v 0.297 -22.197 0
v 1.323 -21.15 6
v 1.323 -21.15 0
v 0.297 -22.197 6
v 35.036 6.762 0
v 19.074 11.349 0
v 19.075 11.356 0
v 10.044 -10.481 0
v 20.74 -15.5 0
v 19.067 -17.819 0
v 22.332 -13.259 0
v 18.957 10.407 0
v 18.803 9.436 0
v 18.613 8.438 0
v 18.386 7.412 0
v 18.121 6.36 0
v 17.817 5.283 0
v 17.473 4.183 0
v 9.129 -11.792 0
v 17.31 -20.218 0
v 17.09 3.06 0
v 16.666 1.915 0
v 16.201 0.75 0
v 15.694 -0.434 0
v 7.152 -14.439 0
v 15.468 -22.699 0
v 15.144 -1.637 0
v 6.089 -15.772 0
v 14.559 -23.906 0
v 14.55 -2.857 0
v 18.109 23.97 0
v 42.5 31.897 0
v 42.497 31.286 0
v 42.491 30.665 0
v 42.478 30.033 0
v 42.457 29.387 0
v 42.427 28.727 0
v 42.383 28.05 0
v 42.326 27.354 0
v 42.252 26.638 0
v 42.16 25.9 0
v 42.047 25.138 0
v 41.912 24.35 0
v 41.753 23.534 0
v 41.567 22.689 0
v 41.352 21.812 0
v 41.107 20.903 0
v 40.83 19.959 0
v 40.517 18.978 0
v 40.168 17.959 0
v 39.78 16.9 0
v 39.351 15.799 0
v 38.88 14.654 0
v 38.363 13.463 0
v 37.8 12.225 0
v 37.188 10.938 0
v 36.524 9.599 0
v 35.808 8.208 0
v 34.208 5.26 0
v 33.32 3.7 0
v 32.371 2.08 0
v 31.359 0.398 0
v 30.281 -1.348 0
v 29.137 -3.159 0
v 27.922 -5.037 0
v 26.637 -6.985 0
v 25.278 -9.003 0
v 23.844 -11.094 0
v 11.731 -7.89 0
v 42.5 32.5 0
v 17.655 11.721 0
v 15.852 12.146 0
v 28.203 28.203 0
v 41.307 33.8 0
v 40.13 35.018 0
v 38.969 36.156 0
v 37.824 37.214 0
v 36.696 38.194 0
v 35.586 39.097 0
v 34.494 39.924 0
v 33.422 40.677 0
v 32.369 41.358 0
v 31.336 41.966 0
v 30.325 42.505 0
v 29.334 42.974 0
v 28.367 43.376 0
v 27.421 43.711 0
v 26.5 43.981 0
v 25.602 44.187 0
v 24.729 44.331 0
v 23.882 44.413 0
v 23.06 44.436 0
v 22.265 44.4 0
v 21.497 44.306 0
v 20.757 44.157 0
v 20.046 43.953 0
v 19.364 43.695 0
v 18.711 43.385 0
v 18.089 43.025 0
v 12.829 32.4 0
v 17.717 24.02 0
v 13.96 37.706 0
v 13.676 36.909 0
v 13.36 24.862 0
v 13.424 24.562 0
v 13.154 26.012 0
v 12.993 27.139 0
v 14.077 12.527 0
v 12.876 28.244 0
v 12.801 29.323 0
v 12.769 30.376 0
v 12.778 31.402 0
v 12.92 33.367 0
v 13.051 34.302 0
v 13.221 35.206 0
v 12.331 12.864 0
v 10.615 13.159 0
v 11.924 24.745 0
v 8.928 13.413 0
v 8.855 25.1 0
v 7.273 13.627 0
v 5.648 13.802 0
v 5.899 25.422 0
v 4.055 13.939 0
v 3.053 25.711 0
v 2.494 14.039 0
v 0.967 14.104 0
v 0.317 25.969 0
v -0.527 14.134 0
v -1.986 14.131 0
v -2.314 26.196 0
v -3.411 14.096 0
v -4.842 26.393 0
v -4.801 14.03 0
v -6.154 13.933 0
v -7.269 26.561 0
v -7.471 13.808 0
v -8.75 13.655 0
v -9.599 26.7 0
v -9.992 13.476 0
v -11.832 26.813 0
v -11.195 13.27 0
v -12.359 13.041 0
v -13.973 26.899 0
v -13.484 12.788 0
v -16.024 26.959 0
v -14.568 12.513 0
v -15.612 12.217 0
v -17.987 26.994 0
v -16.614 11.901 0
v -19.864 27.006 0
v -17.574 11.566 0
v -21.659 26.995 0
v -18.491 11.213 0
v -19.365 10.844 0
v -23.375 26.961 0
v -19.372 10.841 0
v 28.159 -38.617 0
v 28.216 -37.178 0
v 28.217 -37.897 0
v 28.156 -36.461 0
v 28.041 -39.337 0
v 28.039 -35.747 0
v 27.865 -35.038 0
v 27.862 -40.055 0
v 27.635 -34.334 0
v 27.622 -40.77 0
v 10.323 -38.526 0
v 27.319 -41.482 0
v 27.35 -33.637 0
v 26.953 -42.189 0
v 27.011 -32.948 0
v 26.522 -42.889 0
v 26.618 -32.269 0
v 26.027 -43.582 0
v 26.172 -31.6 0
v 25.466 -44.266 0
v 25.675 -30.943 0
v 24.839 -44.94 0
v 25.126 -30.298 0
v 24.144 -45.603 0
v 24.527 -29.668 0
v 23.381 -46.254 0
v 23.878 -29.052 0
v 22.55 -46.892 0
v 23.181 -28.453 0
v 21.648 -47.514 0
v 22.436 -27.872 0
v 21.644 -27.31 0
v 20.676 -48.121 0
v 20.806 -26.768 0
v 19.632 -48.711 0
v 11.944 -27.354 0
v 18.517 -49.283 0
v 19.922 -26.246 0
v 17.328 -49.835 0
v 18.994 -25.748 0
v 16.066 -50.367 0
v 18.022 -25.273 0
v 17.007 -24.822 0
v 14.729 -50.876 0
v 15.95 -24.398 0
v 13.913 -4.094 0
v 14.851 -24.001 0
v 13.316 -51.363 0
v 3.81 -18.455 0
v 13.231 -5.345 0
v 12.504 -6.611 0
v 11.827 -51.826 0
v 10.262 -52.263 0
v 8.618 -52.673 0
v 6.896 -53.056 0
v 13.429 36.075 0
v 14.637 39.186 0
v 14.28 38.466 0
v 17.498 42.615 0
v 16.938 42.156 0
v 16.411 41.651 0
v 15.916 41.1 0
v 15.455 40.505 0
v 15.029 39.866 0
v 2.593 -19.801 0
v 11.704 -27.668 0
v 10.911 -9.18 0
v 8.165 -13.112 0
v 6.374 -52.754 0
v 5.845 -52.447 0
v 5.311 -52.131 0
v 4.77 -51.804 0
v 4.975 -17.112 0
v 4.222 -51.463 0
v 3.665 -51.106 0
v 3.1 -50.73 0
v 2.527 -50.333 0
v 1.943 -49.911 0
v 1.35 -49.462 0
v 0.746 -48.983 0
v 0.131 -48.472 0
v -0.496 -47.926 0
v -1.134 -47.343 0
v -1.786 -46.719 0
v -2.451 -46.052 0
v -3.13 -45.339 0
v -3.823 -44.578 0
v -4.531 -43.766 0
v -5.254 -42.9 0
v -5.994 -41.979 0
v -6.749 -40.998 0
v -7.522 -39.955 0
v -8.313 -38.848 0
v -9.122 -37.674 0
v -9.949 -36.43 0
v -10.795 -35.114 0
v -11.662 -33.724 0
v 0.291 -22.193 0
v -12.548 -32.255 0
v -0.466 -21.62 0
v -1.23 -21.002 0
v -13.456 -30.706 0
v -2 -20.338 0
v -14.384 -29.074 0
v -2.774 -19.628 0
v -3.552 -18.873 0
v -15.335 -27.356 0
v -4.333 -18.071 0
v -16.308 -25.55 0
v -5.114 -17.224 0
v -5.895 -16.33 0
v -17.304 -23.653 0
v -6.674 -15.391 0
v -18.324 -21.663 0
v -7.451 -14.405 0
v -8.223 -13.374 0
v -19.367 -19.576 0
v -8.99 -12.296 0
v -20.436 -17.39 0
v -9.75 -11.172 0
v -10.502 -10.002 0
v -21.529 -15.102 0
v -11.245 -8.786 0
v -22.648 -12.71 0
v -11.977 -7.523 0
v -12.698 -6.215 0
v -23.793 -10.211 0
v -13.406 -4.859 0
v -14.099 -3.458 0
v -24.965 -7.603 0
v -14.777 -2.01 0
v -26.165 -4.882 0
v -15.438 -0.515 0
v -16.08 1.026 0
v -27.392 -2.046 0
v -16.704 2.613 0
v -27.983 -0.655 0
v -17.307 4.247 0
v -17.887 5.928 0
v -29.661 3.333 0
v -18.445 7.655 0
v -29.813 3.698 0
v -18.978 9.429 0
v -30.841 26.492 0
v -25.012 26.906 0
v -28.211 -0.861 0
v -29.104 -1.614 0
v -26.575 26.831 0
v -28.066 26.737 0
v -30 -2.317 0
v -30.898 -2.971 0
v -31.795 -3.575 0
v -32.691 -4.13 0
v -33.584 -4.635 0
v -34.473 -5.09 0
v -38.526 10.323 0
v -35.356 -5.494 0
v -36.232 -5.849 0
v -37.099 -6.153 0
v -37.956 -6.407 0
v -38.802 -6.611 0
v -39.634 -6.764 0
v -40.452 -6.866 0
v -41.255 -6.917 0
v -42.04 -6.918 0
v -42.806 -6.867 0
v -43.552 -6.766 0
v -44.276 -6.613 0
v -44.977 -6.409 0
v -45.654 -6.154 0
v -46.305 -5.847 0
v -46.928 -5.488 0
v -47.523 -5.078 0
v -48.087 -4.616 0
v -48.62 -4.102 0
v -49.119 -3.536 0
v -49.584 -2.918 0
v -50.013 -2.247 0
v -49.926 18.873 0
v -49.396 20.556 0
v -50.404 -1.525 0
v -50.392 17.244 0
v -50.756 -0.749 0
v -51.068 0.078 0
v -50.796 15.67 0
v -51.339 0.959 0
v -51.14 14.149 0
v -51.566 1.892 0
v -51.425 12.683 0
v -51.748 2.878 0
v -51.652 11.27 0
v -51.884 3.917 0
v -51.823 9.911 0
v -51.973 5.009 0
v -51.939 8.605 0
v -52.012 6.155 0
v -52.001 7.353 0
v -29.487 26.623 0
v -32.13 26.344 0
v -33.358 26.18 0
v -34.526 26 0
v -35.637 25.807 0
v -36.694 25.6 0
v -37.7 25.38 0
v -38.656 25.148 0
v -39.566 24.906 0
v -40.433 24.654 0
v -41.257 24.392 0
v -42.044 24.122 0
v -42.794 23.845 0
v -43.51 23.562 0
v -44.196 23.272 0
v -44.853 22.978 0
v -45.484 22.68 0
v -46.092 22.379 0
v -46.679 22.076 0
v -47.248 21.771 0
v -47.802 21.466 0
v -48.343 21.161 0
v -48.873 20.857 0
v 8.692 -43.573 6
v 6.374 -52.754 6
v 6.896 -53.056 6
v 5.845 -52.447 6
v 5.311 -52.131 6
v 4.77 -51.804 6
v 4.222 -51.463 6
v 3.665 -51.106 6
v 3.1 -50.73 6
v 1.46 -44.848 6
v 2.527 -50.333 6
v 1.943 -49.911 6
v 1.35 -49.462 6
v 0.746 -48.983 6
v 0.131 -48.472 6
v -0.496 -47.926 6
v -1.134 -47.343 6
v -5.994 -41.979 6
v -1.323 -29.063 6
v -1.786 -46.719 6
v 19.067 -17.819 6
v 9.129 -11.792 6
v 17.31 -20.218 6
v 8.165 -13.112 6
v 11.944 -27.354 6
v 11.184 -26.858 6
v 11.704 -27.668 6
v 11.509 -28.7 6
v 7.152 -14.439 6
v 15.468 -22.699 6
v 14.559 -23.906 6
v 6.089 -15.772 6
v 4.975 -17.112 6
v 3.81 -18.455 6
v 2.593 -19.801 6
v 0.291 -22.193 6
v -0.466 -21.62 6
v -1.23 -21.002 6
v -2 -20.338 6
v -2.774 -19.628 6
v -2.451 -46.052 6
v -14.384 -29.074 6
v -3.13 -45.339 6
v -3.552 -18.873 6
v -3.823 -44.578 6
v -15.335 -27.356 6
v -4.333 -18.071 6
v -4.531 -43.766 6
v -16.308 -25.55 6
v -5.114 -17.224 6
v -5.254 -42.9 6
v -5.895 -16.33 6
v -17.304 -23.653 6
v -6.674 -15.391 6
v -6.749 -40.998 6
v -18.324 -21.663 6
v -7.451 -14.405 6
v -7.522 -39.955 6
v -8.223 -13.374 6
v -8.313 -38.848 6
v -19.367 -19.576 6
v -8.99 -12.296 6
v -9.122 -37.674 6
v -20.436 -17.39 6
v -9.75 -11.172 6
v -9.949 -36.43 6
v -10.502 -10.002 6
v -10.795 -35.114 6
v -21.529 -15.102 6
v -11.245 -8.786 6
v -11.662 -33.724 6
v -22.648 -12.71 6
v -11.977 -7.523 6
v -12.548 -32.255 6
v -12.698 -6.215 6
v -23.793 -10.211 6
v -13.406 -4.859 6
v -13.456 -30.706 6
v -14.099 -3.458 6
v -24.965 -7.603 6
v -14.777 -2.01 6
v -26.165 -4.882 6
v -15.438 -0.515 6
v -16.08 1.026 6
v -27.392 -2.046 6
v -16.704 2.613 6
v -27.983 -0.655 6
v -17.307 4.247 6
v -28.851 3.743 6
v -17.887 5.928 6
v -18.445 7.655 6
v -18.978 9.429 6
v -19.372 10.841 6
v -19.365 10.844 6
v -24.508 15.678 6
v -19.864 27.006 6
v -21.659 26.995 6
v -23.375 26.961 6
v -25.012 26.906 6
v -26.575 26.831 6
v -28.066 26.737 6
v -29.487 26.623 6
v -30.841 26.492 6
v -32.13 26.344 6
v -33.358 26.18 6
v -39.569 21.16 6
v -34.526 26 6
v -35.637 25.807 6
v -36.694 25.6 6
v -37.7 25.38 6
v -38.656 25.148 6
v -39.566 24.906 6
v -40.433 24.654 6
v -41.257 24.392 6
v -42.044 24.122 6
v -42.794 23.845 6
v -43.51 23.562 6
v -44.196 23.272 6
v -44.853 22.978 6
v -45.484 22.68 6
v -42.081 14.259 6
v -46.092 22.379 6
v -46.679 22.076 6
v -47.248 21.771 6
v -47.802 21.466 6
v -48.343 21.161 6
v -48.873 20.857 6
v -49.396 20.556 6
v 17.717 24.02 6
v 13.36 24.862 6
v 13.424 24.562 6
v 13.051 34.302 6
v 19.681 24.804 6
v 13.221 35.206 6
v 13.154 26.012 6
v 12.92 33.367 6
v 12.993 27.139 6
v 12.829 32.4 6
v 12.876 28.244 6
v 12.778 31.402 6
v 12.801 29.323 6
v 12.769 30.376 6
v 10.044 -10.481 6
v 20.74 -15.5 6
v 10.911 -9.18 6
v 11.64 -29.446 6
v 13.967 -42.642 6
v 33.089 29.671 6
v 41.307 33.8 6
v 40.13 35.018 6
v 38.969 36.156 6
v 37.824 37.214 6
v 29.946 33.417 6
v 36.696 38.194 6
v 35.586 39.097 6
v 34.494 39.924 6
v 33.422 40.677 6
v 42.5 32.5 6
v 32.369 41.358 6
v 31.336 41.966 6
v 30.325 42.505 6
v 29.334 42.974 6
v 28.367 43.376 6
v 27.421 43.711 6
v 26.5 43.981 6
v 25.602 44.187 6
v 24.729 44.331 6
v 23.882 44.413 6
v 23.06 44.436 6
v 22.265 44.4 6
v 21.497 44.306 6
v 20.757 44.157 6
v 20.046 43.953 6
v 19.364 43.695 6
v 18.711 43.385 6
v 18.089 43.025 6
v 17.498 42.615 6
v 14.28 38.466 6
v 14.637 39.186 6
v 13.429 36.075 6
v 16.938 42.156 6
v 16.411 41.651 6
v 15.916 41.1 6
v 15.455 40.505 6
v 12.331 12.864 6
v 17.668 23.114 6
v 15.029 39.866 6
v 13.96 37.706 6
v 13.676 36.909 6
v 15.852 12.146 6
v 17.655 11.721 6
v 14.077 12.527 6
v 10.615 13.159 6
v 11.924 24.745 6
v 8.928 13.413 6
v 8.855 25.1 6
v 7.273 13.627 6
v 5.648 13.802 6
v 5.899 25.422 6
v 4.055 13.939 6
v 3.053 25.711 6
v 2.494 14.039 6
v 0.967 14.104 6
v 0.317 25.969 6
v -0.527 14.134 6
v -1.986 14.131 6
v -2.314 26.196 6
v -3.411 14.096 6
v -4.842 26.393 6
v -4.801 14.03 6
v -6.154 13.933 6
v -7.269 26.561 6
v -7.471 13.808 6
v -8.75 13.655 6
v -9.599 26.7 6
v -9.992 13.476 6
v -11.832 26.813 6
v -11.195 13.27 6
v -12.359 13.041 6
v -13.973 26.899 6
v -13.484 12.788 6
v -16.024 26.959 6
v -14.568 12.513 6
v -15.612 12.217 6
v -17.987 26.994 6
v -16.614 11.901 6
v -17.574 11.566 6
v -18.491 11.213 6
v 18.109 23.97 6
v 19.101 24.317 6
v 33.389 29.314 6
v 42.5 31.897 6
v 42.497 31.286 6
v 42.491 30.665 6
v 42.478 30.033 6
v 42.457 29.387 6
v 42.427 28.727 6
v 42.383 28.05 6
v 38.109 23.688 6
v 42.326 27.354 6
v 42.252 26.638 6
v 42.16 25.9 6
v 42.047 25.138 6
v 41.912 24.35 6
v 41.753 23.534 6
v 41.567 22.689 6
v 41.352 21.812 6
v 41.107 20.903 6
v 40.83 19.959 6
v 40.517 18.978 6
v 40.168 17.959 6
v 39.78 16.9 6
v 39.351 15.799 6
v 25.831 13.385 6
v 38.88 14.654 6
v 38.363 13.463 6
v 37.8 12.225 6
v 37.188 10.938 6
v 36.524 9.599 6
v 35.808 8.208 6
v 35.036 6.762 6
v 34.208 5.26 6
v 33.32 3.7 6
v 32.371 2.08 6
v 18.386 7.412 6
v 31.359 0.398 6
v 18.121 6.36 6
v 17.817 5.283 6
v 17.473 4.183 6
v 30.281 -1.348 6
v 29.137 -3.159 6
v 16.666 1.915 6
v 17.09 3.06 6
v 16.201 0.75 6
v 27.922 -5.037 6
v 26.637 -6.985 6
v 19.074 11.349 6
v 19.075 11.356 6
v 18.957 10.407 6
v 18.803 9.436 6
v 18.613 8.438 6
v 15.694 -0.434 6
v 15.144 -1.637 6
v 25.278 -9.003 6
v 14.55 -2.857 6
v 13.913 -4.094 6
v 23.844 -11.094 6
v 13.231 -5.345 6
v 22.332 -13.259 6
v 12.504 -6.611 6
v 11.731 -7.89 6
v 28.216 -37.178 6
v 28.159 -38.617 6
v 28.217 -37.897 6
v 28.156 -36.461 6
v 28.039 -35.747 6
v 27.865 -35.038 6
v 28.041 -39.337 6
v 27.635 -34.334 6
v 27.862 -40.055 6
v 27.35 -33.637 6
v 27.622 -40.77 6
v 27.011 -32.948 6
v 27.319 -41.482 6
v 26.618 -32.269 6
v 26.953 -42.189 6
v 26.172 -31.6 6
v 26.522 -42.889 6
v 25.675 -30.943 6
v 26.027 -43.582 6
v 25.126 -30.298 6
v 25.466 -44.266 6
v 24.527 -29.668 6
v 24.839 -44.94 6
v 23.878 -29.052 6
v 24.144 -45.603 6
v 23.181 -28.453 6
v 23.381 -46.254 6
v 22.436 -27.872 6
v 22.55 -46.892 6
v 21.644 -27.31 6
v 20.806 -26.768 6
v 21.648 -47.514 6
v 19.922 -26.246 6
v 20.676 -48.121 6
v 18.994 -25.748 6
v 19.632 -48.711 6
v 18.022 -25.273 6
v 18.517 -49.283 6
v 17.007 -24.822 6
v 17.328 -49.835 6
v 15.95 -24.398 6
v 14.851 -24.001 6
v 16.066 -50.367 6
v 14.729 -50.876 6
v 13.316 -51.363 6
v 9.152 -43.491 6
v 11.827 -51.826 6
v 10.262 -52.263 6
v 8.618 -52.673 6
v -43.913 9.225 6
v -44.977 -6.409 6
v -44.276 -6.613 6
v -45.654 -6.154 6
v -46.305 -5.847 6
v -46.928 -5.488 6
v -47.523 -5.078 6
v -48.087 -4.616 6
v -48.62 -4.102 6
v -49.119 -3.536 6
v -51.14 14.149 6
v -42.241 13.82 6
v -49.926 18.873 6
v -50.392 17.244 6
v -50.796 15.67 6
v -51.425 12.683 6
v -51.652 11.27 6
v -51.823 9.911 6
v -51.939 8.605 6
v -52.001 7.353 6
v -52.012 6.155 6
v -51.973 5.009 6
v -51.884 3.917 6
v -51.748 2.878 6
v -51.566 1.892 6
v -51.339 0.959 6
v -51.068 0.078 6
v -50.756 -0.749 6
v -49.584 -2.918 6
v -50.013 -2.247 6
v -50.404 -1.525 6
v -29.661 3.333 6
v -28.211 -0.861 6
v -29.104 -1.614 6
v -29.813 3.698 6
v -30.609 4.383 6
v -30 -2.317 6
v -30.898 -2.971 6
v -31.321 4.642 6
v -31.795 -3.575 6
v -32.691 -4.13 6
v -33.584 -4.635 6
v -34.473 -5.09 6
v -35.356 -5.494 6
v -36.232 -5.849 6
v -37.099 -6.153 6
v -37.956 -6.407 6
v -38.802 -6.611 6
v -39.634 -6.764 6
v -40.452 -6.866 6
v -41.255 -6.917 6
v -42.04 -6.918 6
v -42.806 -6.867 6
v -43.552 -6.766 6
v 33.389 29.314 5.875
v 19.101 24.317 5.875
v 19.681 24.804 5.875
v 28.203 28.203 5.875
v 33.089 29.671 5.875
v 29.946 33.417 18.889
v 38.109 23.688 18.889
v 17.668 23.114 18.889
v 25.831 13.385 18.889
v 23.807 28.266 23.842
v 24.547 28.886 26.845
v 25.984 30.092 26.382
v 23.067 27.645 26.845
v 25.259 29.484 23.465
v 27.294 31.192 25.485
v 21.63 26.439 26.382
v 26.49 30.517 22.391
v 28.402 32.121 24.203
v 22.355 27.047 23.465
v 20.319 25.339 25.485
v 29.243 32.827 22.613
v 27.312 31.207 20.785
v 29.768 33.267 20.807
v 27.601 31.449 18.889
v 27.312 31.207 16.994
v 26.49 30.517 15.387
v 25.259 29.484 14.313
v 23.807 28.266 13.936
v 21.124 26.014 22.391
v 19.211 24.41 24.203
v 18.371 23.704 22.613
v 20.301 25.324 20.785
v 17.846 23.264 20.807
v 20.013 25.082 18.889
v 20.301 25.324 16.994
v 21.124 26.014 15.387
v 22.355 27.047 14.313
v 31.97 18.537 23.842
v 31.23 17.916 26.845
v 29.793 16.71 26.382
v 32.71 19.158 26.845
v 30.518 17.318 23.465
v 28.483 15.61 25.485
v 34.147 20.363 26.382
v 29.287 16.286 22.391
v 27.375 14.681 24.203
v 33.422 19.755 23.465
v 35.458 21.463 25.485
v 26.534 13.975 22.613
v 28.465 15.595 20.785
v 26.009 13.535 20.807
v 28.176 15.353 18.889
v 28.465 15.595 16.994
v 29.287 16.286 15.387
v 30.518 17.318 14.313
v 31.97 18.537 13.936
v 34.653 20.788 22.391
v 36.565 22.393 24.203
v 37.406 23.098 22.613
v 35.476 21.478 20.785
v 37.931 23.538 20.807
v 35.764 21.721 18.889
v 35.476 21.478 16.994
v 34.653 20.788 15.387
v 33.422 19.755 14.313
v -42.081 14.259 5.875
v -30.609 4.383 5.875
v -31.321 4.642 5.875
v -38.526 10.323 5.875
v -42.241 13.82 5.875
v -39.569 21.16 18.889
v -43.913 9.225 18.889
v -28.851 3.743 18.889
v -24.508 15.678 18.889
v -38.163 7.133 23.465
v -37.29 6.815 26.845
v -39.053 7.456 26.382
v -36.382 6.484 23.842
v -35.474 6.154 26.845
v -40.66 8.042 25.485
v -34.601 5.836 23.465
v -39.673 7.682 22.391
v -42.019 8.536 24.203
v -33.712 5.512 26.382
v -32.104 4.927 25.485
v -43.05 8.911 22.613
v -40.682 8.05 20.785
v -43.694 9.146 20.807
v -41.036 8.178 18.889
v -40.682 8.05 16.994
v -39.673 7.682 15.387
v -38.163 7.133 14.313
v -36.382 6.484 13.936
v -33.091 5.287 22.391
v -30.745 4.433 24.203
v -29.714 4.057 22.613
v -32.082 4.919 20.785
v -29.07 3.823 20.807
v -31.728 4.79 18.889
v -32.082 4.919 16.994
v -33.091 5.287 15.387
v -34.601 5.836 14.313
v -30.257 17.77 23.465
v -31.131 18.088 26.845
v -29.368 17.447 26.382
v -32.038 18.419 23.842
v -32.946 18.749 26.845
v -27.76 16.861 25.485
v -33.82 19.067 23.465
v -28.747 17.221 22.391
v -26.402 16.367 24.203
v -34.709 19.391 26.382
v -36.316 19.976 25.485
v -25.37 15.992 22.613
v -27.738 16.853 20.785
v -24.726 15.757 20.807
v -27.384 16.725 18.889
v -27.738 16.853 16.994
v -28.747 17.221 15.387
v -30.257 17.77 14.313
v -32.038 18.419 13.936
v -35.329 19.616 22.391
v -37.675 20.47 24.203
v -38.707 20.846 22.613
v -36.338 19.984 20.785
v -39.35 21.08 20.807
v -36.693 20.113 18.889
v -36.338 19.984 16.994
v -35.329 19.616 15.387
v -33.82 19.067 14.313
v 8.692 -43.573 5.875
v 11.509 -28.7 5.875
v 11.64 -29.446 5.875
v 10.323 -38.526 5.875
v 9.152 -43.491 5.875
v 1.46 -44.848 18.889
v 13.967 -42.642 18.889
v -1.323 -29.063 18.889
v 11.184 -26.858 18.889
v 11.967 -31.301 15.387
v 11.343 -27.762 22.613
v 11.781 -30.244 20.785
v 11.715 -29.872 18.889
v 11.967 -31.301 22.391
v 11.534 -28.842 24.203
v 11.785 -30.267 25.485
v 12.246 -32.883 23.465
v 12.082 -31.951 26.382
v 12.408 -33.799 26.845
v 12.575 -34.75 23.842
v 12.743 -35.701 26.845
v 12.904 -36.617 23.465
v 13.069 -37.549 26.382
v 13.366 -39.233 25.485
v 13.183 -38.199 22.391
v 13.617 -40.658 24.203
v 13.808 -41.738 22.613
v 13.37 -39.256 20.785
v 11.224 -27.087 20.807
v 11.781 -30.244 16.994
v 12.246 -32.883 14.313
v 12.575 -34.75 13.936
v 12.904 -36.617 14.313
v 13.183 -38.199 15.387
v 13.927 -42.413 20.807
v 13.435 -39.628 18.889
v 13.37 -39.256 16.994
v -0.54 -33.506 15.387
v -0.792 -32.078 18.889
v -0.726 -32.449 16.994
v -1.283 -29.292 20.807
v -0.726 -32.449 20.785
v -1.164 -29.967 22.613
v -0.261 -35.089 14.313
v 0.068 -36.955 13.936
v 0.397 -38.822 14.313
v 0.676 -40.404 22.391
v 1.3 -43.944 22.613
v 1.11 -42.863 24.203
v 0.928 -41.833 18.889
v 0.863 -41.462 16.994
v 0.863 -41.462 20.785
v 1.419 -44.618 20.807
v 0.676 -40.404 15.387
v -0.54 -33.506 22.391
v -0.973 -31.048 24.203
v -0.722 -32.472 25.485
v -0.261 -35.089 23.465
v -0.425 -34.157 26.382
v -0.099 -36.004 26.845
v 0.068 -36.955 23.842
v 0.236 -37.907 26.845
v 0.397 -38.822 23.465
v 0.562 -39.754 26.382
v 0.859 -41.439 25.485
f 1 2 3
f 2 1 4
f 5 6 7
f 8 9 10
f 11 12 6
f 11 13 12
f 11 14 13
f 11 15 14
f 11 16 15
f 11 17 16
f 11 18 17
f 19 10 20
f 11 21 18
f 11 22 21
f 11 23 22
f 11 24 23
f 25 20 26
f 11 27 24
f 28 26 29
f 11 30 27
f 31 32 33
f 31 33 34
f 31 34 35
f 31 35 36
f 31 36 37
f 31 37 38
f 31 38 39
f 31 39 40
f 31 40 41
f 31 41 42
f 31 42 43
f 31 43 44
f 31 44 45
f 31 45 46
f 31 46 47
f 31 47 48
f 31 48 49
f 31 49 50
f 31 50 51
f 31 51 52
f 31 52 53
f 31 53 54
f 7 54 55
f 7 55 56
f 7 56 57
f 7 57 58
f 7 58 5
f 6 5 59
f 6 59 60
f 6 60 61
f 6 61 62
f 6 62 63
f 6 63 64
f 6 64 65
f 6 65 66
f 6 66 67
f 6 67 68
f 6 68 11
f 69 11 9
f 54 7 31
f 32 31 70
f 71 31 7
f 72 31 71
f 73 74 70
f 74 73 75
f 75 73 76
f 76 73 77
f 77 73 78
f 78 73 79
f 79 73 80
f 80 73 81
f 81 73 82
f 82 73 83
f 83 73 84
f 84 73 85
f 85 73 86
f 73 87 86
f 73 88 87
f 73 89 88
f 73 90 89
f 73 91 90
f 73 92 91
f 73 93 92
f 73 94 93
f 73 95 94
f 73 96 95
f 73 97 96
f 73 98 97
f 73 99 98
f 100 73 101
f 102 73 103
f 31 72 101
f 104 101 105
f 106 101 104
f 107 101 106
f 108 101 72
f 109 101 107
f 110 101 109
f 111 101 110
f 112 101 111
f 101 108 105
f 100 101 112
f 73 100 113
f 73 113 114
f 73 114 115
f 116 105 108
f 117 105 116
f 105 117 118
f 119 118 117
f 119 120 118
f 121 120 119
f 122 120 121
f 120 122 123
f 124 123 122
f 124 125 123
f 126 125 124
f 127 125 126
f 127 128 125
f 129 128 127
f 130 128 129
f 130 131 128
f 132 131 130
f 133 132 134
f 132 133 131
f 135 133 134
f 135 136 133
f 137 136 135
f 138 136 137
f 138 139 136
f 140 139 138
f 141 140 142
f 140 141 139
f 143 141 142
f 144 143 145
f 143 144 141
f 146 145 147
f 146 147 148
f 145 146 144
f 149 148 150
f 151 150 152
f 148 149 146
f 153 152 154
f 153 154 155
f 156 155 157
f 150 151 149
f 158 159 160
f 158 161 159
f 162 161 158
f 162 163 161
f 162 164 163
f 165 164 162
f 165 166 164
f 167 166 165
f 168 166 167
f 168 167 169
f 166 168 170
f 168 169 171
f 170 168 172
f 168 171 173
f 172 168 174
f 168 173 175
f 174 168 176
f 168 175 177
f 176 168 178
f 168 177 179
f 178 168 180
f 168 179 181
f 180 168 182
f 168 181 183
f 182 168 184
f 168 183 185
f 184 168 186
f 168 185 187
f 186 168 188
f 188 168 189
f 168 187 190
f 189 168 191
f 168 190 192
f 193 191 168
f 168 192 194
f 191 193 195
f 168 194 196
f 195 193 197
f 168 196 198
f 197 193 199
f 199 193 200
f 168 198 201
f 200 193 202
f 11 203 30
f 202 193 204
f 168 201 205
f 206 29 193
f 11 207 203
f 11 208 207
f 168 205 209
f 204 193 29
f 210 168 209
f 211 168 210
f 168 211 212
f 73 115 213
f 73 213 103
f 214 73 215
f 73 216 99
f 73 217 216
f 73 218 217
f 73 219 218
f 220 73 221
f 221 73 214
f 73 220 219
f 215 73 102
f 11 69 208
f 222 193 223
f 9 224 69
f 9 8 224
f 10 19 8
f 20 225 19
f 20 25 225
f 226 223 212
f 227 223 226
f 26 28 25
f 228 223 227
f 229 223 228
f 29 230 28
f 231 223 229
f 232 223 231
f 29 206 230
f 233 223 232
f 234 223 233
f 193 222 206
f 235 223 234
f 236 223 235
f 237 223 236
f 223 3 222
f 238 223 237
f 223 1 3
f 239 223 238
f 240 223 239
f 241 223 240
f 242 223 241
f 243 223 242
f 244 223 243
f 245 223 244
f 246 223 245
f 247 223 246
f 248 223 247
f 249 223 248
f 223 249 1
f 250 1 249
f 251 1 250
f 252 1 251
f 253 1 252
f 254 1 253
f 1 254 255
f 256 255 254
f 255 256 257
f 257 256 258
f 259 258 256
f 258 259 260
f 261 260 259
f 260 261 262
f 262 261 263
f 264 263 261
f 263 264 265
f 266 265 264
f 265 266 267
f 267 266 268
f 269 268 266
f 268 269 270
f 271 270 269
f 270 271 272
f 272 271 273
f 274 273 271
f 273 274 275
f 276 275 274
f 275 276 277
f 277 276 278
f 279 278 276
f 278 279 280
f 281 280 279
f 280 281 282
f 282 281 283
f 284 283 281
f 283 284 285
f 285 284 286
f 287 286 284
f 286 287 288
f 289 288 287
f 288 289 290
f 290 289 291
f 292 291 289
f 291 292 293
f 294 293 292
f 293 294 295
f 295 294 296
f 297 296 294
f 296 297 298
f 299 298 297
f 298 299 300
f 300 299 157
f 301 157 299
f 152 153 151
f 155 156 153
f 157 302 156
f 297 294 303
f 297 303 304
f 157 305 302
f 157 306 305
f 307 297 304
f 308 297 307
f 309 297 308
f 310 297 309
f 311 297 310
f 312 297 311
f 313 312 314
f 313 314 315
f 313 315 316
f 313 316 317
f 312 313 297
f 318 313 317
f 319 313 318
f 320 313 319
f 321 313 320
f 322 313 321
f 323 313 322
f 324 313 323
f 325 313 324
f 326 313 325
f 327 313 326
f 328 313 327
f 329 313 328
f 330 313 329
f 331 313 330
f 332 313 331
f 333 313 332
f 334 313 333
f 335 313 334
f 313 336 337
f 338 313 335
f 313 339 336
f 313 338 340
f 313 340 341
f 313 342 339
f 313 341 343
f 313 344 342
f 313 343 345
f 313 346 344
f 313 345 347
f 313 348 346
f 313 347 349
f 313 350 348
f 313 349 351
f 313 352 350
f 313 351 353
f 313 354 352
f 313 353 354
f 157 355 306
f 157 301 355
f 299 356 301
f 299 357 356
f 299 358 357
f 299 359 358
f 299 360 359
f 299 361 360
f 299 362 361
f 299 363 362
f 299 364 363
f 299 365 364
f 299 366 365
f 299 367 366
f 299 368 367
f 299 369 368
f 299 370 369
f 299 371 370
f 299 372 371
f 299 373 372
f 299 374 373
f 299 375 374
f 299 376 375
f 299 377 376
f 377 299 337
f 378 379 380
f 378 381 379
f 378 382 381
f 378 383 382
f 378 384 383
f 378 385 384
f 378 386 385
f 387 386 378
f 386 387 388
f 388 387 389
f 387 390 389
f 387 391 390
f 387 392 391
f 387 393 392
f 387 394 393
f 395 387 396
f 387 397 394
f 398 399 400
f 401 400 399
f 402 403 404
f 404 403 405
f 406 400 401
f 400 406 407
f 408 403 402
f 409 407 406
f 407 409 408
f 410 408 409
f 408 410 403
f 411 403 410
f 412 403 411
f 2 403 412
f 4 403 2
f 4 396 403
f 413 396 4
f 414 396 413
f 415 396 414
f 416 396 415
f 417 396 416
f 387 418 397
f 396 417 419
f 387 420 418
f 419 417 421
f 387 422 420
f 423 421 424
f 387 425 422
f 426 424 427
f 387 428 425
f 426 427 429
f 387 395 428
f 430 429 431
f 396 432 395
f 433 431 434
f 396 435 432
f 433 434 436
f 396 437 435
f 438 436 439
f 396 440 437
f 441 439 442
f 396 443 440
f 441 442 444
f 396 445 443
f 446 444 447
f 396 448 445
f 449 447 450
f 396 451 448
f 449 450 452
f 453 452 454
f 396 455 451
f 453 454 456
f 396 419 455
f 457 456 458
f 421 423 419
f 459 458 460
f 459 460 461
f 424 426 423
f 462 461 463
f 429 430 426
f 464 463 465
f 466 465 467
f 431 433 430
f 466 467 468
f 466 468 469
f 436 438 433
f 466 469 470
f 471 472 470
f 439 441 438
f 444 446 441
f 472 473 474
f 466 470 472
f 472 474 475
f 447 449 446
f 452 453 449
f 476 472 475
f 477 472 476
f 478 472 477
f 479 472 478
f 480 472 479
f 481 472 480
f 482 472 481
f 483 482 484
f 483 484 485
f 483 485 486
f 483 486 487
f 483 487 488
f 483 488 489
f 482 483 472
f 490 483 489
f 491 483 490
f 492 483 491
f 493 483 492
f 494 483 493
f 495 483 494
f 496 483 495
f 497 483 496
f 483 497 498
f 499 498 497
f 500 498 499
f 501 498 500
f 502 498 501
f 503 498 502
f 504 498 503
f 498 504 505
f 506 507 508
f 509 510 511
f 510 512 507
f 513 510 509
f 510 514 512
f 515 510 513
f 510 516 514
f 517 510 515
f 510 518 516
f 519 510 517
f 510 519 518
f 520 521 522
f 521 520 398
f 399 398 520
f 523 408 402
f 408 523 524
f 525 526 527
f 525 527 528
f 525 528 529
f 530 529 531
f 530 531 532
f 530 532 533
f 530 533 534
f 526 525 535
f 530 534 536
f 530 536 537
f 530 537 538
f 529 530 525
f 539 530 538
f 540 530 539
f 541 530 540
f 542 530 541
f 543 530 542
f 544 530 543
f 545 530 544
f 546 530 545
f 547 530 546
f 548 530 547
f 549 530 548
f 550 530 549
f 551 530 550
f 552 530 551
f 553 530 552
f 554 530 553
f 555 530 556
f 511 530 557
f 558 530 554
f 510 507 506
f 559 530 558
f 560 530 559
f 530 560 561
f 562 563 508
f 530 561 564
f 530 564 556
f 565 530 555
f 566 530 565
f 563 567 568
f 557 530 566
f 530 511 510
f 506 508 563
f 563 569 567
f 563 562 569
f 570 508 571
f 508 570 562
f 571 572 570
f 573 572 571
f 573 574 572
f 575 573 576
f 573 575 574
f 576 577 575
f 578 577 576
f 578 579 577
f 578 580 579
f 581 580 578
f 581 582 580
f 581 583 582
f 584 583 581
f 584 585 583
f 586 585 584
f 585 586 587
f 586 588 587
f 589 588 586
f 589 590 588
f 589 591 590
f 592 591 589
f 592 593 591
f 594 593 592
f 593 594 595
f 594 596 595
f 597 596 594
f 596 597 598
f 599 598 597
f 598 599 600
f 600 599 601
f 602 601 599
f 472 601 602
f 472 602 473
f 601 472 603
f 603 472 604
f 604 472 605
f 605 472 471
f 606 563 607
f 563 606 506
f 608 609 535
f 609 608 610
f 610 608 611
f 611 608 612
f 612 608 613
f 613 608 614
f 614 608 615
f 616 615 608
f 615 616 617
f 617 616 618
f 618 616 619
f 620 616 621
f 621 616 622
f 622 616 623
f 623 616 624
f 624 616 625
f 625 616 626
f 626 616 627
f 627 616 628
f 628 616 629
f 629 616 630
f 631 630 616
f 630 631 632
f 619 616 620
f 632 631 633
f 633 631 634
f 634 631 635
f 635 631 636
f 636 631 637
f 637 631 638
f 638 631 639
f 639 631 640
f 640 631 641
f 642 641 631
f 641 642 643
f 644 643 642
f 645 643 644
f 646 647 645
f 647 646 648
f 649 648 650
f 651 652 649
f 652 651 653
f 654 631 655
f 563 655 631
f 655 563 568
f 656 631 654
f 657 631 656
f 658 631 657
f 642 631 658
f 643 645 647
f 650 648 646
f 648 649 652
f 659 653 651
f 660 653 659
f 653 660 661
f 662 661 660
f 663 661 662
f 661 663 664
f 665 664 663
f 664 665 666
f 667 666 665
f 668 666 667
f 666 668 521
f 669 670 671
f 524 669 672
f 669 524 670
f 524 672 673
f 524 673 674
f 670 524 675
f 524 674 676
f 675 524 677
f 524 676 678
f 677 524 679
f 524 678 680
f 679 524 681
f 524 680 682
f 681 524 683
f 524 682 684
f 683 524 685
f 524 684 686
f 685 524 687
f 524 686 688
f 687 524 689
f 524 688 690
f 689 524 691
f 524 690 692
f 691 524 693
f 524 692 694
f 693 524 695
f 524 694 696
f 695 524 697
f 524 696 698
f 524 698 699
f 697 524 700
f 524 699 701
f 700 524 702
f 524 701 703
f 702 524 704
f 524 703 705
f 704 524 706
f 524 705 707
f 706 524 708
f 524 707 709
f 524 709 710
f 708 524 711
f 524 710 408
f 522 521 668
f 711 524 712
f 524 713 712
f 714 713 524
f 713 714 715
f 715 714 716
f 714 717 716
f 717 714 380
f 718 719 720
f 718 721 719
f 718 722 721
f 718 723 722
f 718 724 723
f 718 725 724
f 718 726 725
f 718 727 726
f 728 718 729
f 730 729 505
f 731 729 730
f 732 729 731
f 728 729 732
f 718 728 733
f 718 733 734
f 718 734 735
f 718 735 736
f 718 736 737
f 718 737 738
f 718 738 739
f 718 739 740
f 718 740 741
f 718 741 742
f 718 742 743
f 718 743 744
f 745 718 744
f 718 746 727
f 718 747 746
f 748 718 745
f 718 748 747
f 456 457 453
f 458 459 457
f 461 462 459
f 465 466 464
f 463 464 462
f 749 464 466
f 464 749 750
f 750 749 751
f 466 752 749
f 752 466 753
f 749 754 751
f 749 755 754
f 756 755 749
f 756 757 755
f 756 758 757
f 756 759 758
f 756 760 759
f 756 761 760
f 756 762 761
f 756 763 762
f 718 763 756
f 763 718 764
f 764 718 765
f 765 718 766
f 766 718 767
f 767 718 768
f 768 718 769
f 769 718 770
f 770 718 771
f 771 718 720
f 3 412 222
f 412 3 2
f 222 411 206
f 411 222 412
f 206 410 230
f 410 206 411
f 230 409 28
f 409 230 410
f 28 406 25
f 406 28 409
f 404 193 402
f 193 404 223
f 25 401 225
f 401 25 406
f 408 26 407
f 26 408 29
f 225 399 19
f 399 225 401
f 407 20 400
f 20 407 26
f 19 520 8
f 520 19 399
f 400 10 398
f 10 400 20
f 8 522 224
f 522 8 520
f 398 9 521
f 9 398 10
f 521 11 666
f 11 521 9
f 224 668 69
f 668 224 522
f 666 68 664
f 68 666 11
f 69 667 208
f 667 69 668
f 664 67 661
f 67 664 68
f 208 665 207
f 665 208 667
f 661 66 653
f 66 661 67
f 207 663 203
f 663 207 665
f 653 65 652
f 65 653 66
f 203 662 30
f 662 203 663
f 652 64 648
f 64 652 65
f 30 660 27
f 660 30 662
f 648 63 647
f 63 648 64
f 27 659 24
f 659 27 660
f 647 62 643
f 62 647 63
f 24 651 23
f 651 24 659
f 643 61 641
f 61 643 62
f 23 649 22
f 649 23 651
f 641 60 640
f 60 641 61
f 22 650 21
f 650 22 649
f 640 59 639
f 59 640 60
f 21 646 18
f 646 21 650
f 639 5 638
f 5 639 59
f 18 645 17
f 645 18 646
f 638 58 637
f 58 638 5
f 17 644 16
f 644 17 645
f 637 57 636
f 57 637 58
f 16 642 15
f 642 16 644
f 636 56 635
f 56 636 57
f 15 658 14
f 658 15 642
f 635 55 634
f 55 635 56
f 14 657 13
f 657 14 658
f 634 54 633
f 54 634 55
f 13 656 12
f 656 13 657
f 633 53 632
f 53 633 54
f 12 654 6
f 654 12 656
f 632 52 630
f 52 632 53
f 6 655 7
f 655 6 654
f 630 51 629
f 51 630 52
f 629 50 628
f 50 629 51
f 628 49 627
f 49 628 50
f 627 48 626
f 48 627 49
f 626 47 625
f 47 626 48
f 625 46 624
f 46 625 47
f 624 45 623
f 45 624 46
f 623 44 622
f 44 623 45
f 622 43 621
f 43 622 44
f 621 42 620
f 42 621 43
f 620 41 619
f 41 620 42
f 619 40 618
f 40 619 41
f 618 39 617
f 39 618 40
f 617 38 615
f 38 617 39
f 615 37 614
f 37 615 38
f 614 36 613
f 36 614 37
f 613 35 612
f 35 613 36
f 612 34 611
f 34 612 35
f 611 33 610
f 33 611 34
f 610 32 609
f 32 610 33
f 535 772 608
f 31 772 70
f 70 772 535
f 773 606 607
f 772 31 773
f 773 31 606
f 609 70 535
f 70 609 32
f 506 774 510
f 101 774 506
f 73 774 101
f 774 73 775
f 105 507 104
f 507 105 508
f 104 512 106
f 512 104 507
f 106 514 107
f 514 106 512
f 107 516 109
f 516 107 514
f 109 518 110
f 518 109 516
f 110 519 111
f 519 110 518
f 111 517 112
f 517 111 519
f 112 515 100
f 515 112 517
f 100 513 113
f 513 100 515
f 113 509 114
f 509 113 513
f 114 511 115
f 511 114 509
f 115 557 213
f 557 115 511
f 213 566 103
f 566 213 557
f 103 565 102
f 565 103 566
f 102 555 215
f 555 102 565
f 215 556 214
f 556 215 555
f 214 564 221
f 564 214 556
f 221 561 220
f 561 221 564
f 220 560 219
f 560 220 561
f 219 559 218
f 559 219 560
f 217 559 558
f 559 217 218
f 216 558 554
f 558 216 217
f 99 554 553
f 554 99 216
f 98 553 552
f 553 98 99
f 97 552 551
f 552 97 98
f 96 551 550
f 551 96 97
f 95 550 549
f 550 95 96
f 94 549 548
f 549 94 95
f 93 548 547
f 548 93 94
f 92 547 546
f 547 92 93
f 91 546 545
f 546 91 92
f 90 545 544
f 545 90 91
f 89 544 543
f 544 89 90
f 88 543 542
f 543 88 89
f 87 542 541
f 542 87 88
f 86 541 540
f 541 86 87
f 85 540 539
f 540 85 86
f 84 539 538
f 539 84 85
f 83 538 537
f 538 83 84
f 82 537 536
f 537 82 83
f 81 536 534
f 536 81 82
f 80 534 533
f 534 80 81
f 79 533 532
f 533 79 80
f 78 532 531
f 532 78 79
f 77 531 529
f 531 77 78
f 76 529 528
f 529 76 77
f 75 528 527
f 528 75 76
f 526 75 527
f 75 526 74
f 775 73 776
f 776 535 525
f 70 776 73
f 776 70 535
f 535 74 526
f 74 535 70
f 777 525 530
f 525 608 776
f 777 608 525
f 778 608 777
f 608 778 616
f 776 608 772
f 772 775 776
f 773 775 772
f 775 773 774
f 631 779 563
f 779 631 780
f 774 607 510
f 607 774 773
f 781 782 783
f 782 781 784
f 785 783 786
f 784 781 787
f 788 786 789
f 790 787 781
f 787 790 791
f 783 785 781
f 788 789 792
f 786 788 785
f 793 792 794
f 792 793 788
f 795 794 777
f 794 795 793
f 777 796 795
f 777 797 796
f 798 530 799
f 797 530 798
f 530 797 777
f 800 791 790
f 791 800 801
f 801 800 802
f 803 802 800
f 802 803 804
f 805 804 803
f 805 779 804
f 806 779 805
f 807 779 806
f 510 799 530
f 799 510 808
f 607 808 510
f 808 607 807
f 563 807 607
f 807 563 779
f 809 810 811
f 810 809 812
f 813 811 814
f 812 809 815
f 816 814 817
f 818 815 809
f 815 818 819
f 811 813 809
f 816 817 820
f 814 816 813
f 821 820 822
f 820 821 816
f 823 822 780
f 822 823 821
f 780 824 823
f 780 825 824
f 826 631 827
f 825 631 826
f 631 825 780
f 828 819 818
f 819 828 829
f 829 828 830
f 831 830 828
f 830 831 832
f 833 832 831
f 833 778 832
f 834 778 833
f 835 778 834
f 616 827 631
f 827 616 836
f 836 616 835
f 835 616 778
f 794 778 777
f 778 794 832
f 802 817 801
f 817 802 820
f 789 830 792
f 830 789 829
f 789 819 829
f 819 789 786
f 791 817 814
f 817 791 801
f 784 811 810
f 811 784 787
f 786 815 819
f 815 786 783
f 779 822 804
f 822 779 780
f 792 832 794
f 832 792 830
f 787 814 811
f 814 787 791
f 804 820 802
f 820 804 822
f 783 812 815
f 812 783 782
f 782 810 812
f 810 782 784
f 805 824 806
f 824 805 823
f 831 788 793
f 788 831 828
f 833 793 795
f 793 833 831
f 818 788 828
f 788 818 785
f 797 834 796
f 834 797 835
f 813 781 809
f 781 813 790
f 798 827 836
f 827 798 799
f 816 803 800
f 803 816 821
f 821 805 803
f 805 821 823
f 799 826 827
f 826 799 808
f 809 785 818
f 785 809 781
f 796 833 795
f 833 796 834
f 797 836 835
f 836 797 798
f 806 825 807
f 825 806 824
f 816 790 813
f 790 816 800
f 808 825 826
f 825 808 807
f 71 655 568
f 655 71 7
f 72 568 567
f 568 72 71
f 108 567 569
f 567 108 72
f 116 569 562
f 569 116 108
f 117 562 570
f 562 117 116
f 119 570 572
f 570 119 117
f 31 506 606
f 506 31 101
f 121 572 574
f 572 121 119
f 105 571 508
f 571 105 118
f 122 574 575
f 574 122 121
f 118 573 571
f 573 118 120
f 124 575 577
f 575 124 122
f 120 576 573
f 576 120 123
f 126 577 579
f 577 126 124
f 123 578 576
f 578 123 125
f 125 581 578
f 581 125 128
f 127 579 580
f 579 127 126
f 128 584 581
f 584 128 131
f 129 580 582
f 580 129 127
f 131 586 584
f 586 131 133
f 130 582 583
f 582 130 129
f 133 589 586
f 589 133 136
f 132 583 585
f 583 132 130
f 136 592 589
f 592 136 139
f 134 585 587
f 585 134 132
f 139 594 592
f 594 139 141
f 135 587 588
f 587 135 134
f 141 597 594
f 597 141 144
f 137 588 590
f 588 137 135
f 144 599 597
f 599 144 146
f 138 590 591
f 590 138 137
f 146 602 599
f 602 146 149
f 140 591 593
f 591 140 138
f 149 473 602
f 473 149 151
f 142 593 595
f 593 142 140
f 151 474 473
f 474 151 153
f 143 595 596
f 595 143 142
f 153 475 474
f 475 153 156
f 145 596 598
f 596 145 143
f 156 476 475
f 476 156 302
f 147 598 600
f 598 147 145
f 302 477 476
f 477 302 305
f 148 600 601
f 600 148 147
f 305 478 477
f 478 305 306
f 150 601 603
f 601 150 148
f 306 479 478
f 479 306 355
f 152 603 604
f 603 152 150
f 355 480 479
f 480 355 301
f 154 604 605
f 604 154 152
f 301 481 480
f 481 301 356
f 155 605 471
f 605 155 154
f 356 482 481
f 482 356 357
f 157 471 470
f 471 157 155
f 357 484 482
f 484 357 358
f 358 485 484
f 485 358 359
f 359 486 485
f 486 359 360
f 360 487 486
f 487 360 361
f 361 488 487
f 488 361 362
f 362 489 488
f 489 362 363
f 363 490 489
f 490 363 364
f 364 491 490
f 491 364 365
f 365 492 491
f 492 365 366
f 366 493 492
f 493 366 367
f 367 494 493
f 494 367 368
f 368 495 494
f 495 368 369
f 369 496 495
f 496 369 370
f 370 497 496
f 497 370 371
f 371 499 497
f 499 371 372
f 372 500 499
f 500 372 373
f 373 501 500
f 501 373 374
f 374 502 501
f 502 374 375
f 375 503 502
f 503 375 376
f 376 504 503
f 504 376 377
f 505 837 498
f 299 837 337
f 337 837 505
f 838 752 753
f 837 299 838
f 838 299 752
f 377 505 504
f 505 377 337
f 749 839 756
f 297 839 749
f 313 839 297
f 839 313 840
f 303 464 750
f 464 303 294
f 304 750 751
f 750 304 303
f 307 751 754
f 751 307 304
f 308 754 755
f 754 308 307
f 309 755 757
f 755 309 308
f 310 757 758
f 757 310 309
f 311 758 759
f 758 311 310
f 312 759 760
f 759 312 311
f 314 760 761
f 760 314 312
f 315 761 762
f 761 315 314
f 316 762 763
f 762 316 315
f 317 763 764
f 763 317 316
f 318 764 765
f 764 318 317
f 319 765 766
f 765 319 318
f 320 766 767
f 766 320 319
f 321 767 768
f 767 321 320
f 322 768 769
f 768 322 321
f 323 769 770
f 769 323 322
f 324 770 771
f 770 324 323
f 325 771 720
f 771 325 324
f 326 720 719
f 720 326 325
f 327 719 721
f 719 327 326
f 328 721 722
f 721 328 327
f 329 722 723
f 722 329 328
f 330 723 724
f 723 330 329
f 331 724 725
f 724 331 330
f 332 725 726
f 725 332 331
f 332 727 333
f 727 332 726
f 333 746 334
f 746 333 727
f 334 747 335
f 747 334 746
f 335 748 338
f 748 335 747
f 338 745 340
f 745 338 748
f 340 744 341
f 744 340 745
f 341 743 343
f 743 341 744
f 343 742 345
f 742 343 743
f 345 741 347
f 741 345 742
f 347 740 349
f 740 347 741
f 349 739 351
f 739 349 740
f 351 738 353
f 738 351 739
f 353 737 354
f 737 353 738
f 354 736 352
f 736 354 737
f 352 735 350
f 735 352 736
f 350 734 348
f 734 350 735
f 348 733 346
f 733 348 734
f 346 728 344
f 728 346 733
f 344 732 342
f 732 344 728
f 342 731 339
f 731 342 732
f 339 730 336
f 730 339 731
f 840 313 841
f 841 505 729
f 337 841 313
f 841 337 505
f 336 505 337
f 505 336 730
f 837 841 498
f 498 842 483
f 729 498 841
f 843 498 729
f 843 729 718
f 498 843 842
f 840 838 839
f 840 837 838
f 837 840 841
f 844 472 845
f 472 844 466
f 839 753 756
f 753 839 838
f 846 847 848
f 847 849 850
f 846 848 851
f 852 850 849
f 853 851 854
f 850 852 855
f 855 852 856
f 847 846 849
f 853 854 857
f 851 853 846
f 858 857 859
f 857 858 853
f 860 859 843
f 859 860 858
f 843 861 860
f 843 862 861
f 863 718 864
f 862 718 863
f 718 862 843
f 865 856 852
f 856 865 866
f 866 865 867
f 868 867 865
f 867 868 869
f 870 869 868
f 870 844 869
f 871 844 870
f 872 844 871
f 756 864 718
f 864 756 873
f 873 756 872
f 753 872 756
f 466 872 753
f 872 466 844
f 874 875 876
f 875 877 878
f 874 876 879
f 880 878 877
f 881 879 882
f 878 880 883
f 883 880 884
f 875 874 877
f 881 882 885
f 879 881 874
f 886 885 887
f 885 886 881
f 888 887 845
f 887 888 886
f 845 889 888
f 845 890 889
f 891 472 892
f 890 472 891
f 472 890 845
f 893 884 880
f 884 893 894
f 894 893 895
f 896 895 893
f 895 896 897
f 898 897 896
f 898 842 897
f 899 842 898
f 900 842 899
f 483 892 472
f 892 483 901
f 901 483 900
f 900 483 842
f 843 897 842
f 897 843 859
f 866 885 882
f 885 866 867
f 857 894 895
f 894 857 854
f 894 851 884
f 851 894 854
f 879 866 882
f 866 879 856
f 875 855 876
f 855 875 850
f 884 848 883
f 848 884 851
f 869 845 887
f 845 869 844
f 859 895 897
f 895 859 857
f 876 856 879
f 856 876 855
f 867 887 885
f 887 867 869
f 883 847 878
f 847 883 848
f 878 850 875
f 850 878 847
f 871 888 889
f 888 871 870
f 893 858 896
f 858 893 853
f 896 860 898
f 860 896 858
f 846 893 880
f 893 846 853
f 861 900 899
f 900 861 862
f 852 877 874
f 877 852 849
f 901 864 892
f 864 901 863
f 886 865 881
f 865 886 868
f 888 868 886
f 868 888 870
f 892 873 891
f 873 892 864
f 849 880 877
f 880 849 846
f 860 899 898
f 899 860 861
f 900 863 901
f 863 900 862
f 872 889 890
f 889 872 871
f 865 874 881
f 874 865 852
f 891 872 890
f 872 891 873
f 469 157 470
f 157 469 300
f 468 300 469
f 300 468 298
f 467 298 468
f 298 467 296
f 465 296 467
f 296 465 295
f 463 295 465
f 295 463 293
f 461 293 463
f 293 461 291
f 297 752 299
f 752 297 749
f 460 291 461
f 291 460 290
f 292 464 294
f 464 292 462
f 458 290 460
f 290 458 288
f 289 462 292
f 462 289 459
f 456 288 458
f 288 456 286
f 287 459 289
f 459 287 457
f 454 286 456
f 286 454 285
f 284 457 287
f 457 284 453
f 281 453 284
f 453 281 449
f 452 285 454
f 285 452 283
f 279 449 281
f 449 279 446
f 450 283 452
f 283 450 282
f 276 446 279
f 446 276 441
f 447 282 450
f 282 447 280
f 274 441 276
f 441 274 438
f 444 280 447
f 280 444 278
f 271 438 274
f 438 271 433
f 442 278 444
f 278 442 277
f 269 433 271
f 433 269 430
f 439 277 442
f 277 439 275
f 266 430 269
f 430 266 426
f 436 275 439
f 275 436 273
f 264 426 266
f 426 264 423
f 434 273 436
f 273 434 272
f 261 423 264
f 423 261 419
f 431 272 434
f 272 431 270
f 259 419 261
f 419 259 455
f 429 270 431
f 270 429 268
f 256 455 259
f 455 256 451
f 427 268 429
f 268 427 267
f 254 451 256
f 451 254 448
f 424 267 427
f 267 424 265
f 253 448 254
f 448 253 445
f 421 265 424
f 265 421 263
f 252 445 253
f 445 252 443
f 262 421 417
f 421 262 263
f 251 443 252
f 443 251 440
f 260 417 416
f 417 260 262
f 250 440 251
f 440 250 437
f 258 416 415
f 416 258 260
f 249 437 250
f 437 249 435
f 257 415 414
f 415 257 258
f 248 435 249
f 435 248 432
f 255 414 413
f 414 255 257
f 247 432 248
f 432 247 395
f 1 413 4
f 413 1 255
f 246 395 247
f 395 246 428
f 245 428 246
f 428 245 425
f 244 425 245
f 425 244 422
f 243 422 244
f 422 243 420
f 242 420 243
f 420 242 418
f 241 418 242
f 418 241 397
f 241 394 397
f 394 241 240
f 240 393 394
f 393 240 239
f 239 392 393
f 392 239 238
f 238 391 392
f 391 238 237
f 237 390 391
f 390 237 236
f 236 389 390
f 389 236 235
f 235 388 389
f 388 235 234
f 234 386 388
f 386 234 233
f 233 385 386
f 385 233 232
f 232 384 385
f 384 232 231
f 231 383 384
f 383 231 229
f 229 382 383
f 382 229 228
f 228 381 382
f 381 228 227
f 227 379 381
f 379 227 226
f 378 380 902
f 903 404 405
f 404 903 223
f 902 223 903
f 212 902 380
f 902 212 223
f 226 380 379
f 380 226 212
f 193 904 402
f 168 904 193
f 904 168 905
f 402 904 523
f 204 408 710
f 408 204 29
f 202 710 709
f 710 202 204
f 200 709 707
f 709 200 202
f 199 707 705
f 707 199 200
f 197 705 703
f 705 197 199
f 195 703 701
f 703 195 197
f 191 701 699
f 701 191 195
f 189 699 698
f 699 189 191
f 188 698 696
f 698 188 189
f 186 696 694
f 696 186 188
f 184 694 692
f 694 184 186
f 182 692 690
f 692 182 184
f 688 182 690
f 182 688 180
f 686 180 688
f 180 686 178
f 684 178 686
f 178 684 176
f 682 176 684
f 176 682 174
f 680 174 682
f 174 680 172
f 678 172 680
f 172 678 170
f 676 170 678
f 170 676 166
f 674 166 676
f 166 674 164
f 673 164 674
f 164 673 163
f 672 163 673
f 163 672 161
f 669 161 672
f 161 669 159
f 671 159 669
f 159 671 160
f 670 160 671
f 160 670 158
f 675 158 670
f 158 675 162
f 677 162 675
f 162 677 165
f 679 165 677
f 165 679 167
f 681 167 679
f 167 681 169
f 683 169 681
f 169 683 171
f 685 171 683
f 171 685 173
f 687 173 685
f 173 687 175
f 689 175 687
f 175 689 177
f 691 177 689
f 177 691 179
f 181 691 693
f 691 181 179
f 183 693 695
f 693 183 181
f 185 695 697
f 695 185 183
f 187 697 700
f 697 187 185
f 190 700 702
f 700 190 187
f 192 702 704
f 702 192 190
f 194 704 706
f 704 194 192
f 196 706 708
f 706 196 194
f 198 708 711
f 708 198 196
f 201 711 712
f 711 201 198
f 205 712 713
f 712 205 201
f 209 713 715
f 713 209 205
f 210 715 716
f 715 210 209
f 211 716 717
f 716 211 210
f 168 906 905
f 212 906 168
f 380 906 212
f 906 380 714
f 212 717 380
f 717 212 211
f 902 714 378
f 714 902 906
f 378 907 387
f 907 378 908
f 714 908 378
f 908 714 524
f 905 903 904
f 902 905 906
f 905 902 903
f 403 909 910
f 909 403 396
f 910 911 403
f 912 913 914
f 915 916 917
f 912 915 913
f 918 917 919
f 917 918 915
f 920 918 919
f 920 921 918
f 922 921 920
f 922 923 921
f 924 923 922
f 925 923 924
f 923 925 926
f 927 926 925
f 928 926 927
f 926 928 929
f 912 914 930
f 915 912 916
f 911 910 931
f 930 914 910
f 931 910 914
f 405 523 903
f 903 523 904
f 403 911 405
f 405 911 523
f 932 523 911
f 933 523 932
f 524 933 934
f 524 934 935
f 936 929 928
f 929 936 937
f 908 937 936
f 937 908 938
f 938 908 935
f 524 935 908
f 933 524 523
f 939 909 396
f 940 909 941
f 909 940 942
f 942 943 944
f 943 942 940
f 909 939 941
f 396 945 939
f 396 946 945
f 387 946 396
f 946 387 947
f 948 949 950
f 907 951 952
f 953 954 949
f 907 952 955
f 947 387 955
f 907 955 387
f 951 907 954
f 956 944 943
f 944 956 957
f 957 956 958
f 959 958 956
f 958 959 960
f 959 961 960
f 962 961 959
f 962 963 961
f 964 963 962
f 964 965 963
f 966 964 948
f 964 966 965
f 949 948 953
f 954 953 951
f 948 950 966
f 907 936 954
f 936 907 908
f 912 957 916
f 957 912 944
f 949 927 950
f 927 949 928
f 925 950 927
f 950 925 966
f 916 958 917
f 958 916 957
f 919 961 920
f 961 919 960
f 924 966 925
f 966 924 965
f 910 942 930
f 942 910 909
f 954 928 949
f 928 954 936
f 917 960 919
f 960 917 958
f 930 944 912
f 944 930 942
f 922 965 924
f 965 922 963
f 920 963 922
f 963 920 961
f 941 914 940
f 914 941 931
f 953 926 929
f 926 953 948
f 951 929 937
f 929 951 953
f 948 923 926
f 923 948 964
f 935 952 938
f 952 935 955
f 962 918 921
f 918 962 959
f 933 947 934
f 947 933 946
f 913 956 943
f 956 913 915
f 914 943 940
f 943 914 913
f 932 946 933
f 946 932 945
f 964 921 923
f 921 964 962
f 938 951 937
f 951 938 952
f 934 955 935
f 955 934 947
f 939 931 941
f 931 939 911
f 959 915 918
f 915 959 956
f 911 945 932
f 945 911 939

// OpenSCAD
goldenratio = 1.61803399;
joinfactor = 0.125; 

gSteps = 50;
gHeight = 6;

gArmLength = 45;

gAxleRadius = 3/8/2*25.4*1.04; 
gAxleOR = gAxleRadius*2*goldenratio;
gAxleLength = 1/2*25.4;

//axlemount(gAxleLength, gAxleOR, gAxleRadius, 5); 

//SwoopArm();
SwoopArms();

module axlemount(axlelength, axlesize, axleRadius, axleoffset) 
{
	difference()
	{
		union()
		{
			// The base of the part
			translate([-axlesize/2, -axlelength/2, 0])
			cube(size=[axlesize, axlelength, axlesize/2+axleoffset]);

			// The rounded top of the part
			translate([0, 0, axlesize/2+axleoffset])
			rotate([90, 0, 0])
			cylinder(r= axlesize/2, h=axlelength, center=true);
		}

		// Subtract out the axle hole
		translate([0, 0, axlesize/2+axleoffset])
		rotate([90, 0, 0])
		cylinder(r= axleRadius, h=axlelength+2*joinfactor, center=true);
	}
}

module SwoopArm(width =20)
{
	endradius = width/2;
	halfarm = gArmLength / 2;

	BezCubicRibbon([
		[0,-halfarm],[halfarm,0],[halfarm,halfarm],[halfarm/goldenratio,halfarm]], 
		[[0,-halfarm-width],[halfarm+width,width/2],[halfarm+width,halfarm],[halfarm+width,halfarm+width/2]]
	); 
	
	// The looped end
	BezCubicFilletColored(
		[[halfarm/goldenratio,halfarm],
		[halfarm/goldenratio/goldenratio,halfarm+width],
		[halfarm,halfarm+width*goldenratio],
		[halfarm+width,halfarm+width/2]], 
		[(halfarm/goldenratio)+((halfarm+width)-(halfarm/goldenratio))/2,(halfarm/goldenratio)+((halfarm+width)-(halfarm/goldenratio))/2 ]);

	rotate([0,0,40])
	translate([halfarm*goldenratio, 0,gHeight-joinfactor])
	rotate([0,0,0])
	axlemount(gAxleLength, gAxleOR, gAxleRadius, 5); 

}

module SwoopArms()
{
	numberofarms = 3;
	angle = 360/numberofarms;

	for(arm=[0:numberofarms-1])
	{
		rotate([0,0,angle*arm])
		SwoopArm();
	}
}

//=======================================
// Functions
// These are the 4 blending functions for a cubic bezier curve
//=======================================
// Bernstein Polynomials
function BEZ03(u) = pow((1-u), 3);
function BEZ13(u) = 3*u*(pow((1-u),2));
function BEZ23(u) = 3*(pow(u,2))*(1-u);
function BEZ33(u) = pow(u,3);

// Calculate a singe point along a cubic bezier curve
function PointOnBezCubic2D(p0, p1, p2, p3, u) = [
BEZ03(u)*p0[0]+BEZ13(u)*p1[0]+BEZ23(u)*p2[0]+BEZ33(u)*p3[0],
BEZ03(u)*p0[1]+BEZ13(u)*p1[1]+BEZ23(u)*p2[1]+BEZ33(u)*p3[1]];

function PointOnBezCubic3D(p0, p1, p2, p3, u) = [
BEZ03(u)*p0[0]+BEZ13(u)*p1[0]+BEZ23(u)*p2[0]+BEZ33(u)*p3[0],
BEZ03(u)*p0[1]+BEZ13(u)*p1[1]+BEZ23(u)*p2[1]+BEZ33(u)*p3[1],
BEZ03(u)*p0[2]+BEZ13(u)*p1[2]+BEZ23(u)*p2[2]+BEZ33(u)*p3[2]];

//=======================================
// Modules
//=======================================

module BezCubicFilletColored(c, focalPoint, steps=gSteps, height=gHeight, colors=[[1,0,0],[1,1,0],[0,1,1],[0,0,1]])
{
for(step = [steps:1])
{
color(PointOnBezCubic3D(colors[0], colors[1], colors[2], colors[3], step/steps))
linear_extrude(height = height, convexity = 10) 
polygon(
points=[
focalPoint,
PointOnBezCubic2D(c[0], c[1], c[2],c[3], step/steps),
PointOnBezCubic2D(c[0], c[1], c[2],c[3], (step-1)/steps)],
paths=[[0,1,2,0]]
);
}
}


module BezCubicRibbon(c1, c2, steps=gSteps, height=gHeight, colors=[[1,0,0],[1,1,0],[0,1,1],[0,0,1]])
{
for (step=[0:steps-1])
{
color(PointOnBezCubic3D(colors[0], colors[1], colors[2], colors[3], step/steps))
linear_extrude(height = height, convexity = 10) 
polygon(
points=[
PointOnBezCubic2D(c1[0], c1[1], c1[2],c1[3], step/steps),
PointOnBezCubic2D(c2[0], c2[1], c2[2],c2[3], (step)/steps),
PointOnBezCubic2D(c2[0], c2[1], c2[2],c2[3], (step+1)/steps),
PointOnBezCubic2D(c1[0], c1[1], c1[2],c1[3], (step+1)/steps)],
paths=[[0,1,2,3]]
);

}
}
